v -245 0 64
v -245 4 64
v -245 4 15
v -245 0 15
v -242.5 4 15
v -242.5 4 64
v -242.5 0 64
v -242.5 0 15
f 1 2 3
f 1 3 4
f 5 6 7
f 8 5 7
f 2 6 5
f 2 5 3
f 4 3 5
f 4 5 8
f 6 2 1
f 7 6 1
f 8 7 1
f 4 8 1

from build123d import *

# Parameters (mm, degrees)
RECTANGLE065_W   = 6
RECTANGLE065_H   = 6
EXTRUDE079_DEPTH = 7.5
FACEBINDER013_W  = 4
FACEBINDER013_H  = 2.5
EXTRUDE052_DEPTH = 55


with BuildPart() as extrude079:
    # Rectangle065 → Extrude079 (new body)
    with BuildSketch(Plane(origin=(-250, 6, 64), x_dir=(0, -1, 0), z_dir=(-1, 0, 0))):
        with Locations((3, 3)):
            Rectangle(RECTANGLE065_W, RECTANGLE065_H)
    extrude(amount=-EXTRUDE079_DEPTH)


with BuildPart() as cut001:
    # Facebinder013 → Extrude052 (new body)
    with BuildSketch(Plane(origin=(-241.25, 2, 70), x_dir=(0, -1, 0), z_dir=(0, 0, -1))):
        Rectangle(FACEBINDER013_W, FACEBINDER013_H)
    extrude(amount=EXTRUDE052_DEPTH)


with BuildPart() as cut001_1:
    # Extrude052 placement: moved
    add(cut001.part.moved(Location((-2.5, 0, 0))))

    # Cut001: cut Extrude079
    add(extrude079.part, mode=Mode.SUBTRACT)


solid = cut001_1.part
